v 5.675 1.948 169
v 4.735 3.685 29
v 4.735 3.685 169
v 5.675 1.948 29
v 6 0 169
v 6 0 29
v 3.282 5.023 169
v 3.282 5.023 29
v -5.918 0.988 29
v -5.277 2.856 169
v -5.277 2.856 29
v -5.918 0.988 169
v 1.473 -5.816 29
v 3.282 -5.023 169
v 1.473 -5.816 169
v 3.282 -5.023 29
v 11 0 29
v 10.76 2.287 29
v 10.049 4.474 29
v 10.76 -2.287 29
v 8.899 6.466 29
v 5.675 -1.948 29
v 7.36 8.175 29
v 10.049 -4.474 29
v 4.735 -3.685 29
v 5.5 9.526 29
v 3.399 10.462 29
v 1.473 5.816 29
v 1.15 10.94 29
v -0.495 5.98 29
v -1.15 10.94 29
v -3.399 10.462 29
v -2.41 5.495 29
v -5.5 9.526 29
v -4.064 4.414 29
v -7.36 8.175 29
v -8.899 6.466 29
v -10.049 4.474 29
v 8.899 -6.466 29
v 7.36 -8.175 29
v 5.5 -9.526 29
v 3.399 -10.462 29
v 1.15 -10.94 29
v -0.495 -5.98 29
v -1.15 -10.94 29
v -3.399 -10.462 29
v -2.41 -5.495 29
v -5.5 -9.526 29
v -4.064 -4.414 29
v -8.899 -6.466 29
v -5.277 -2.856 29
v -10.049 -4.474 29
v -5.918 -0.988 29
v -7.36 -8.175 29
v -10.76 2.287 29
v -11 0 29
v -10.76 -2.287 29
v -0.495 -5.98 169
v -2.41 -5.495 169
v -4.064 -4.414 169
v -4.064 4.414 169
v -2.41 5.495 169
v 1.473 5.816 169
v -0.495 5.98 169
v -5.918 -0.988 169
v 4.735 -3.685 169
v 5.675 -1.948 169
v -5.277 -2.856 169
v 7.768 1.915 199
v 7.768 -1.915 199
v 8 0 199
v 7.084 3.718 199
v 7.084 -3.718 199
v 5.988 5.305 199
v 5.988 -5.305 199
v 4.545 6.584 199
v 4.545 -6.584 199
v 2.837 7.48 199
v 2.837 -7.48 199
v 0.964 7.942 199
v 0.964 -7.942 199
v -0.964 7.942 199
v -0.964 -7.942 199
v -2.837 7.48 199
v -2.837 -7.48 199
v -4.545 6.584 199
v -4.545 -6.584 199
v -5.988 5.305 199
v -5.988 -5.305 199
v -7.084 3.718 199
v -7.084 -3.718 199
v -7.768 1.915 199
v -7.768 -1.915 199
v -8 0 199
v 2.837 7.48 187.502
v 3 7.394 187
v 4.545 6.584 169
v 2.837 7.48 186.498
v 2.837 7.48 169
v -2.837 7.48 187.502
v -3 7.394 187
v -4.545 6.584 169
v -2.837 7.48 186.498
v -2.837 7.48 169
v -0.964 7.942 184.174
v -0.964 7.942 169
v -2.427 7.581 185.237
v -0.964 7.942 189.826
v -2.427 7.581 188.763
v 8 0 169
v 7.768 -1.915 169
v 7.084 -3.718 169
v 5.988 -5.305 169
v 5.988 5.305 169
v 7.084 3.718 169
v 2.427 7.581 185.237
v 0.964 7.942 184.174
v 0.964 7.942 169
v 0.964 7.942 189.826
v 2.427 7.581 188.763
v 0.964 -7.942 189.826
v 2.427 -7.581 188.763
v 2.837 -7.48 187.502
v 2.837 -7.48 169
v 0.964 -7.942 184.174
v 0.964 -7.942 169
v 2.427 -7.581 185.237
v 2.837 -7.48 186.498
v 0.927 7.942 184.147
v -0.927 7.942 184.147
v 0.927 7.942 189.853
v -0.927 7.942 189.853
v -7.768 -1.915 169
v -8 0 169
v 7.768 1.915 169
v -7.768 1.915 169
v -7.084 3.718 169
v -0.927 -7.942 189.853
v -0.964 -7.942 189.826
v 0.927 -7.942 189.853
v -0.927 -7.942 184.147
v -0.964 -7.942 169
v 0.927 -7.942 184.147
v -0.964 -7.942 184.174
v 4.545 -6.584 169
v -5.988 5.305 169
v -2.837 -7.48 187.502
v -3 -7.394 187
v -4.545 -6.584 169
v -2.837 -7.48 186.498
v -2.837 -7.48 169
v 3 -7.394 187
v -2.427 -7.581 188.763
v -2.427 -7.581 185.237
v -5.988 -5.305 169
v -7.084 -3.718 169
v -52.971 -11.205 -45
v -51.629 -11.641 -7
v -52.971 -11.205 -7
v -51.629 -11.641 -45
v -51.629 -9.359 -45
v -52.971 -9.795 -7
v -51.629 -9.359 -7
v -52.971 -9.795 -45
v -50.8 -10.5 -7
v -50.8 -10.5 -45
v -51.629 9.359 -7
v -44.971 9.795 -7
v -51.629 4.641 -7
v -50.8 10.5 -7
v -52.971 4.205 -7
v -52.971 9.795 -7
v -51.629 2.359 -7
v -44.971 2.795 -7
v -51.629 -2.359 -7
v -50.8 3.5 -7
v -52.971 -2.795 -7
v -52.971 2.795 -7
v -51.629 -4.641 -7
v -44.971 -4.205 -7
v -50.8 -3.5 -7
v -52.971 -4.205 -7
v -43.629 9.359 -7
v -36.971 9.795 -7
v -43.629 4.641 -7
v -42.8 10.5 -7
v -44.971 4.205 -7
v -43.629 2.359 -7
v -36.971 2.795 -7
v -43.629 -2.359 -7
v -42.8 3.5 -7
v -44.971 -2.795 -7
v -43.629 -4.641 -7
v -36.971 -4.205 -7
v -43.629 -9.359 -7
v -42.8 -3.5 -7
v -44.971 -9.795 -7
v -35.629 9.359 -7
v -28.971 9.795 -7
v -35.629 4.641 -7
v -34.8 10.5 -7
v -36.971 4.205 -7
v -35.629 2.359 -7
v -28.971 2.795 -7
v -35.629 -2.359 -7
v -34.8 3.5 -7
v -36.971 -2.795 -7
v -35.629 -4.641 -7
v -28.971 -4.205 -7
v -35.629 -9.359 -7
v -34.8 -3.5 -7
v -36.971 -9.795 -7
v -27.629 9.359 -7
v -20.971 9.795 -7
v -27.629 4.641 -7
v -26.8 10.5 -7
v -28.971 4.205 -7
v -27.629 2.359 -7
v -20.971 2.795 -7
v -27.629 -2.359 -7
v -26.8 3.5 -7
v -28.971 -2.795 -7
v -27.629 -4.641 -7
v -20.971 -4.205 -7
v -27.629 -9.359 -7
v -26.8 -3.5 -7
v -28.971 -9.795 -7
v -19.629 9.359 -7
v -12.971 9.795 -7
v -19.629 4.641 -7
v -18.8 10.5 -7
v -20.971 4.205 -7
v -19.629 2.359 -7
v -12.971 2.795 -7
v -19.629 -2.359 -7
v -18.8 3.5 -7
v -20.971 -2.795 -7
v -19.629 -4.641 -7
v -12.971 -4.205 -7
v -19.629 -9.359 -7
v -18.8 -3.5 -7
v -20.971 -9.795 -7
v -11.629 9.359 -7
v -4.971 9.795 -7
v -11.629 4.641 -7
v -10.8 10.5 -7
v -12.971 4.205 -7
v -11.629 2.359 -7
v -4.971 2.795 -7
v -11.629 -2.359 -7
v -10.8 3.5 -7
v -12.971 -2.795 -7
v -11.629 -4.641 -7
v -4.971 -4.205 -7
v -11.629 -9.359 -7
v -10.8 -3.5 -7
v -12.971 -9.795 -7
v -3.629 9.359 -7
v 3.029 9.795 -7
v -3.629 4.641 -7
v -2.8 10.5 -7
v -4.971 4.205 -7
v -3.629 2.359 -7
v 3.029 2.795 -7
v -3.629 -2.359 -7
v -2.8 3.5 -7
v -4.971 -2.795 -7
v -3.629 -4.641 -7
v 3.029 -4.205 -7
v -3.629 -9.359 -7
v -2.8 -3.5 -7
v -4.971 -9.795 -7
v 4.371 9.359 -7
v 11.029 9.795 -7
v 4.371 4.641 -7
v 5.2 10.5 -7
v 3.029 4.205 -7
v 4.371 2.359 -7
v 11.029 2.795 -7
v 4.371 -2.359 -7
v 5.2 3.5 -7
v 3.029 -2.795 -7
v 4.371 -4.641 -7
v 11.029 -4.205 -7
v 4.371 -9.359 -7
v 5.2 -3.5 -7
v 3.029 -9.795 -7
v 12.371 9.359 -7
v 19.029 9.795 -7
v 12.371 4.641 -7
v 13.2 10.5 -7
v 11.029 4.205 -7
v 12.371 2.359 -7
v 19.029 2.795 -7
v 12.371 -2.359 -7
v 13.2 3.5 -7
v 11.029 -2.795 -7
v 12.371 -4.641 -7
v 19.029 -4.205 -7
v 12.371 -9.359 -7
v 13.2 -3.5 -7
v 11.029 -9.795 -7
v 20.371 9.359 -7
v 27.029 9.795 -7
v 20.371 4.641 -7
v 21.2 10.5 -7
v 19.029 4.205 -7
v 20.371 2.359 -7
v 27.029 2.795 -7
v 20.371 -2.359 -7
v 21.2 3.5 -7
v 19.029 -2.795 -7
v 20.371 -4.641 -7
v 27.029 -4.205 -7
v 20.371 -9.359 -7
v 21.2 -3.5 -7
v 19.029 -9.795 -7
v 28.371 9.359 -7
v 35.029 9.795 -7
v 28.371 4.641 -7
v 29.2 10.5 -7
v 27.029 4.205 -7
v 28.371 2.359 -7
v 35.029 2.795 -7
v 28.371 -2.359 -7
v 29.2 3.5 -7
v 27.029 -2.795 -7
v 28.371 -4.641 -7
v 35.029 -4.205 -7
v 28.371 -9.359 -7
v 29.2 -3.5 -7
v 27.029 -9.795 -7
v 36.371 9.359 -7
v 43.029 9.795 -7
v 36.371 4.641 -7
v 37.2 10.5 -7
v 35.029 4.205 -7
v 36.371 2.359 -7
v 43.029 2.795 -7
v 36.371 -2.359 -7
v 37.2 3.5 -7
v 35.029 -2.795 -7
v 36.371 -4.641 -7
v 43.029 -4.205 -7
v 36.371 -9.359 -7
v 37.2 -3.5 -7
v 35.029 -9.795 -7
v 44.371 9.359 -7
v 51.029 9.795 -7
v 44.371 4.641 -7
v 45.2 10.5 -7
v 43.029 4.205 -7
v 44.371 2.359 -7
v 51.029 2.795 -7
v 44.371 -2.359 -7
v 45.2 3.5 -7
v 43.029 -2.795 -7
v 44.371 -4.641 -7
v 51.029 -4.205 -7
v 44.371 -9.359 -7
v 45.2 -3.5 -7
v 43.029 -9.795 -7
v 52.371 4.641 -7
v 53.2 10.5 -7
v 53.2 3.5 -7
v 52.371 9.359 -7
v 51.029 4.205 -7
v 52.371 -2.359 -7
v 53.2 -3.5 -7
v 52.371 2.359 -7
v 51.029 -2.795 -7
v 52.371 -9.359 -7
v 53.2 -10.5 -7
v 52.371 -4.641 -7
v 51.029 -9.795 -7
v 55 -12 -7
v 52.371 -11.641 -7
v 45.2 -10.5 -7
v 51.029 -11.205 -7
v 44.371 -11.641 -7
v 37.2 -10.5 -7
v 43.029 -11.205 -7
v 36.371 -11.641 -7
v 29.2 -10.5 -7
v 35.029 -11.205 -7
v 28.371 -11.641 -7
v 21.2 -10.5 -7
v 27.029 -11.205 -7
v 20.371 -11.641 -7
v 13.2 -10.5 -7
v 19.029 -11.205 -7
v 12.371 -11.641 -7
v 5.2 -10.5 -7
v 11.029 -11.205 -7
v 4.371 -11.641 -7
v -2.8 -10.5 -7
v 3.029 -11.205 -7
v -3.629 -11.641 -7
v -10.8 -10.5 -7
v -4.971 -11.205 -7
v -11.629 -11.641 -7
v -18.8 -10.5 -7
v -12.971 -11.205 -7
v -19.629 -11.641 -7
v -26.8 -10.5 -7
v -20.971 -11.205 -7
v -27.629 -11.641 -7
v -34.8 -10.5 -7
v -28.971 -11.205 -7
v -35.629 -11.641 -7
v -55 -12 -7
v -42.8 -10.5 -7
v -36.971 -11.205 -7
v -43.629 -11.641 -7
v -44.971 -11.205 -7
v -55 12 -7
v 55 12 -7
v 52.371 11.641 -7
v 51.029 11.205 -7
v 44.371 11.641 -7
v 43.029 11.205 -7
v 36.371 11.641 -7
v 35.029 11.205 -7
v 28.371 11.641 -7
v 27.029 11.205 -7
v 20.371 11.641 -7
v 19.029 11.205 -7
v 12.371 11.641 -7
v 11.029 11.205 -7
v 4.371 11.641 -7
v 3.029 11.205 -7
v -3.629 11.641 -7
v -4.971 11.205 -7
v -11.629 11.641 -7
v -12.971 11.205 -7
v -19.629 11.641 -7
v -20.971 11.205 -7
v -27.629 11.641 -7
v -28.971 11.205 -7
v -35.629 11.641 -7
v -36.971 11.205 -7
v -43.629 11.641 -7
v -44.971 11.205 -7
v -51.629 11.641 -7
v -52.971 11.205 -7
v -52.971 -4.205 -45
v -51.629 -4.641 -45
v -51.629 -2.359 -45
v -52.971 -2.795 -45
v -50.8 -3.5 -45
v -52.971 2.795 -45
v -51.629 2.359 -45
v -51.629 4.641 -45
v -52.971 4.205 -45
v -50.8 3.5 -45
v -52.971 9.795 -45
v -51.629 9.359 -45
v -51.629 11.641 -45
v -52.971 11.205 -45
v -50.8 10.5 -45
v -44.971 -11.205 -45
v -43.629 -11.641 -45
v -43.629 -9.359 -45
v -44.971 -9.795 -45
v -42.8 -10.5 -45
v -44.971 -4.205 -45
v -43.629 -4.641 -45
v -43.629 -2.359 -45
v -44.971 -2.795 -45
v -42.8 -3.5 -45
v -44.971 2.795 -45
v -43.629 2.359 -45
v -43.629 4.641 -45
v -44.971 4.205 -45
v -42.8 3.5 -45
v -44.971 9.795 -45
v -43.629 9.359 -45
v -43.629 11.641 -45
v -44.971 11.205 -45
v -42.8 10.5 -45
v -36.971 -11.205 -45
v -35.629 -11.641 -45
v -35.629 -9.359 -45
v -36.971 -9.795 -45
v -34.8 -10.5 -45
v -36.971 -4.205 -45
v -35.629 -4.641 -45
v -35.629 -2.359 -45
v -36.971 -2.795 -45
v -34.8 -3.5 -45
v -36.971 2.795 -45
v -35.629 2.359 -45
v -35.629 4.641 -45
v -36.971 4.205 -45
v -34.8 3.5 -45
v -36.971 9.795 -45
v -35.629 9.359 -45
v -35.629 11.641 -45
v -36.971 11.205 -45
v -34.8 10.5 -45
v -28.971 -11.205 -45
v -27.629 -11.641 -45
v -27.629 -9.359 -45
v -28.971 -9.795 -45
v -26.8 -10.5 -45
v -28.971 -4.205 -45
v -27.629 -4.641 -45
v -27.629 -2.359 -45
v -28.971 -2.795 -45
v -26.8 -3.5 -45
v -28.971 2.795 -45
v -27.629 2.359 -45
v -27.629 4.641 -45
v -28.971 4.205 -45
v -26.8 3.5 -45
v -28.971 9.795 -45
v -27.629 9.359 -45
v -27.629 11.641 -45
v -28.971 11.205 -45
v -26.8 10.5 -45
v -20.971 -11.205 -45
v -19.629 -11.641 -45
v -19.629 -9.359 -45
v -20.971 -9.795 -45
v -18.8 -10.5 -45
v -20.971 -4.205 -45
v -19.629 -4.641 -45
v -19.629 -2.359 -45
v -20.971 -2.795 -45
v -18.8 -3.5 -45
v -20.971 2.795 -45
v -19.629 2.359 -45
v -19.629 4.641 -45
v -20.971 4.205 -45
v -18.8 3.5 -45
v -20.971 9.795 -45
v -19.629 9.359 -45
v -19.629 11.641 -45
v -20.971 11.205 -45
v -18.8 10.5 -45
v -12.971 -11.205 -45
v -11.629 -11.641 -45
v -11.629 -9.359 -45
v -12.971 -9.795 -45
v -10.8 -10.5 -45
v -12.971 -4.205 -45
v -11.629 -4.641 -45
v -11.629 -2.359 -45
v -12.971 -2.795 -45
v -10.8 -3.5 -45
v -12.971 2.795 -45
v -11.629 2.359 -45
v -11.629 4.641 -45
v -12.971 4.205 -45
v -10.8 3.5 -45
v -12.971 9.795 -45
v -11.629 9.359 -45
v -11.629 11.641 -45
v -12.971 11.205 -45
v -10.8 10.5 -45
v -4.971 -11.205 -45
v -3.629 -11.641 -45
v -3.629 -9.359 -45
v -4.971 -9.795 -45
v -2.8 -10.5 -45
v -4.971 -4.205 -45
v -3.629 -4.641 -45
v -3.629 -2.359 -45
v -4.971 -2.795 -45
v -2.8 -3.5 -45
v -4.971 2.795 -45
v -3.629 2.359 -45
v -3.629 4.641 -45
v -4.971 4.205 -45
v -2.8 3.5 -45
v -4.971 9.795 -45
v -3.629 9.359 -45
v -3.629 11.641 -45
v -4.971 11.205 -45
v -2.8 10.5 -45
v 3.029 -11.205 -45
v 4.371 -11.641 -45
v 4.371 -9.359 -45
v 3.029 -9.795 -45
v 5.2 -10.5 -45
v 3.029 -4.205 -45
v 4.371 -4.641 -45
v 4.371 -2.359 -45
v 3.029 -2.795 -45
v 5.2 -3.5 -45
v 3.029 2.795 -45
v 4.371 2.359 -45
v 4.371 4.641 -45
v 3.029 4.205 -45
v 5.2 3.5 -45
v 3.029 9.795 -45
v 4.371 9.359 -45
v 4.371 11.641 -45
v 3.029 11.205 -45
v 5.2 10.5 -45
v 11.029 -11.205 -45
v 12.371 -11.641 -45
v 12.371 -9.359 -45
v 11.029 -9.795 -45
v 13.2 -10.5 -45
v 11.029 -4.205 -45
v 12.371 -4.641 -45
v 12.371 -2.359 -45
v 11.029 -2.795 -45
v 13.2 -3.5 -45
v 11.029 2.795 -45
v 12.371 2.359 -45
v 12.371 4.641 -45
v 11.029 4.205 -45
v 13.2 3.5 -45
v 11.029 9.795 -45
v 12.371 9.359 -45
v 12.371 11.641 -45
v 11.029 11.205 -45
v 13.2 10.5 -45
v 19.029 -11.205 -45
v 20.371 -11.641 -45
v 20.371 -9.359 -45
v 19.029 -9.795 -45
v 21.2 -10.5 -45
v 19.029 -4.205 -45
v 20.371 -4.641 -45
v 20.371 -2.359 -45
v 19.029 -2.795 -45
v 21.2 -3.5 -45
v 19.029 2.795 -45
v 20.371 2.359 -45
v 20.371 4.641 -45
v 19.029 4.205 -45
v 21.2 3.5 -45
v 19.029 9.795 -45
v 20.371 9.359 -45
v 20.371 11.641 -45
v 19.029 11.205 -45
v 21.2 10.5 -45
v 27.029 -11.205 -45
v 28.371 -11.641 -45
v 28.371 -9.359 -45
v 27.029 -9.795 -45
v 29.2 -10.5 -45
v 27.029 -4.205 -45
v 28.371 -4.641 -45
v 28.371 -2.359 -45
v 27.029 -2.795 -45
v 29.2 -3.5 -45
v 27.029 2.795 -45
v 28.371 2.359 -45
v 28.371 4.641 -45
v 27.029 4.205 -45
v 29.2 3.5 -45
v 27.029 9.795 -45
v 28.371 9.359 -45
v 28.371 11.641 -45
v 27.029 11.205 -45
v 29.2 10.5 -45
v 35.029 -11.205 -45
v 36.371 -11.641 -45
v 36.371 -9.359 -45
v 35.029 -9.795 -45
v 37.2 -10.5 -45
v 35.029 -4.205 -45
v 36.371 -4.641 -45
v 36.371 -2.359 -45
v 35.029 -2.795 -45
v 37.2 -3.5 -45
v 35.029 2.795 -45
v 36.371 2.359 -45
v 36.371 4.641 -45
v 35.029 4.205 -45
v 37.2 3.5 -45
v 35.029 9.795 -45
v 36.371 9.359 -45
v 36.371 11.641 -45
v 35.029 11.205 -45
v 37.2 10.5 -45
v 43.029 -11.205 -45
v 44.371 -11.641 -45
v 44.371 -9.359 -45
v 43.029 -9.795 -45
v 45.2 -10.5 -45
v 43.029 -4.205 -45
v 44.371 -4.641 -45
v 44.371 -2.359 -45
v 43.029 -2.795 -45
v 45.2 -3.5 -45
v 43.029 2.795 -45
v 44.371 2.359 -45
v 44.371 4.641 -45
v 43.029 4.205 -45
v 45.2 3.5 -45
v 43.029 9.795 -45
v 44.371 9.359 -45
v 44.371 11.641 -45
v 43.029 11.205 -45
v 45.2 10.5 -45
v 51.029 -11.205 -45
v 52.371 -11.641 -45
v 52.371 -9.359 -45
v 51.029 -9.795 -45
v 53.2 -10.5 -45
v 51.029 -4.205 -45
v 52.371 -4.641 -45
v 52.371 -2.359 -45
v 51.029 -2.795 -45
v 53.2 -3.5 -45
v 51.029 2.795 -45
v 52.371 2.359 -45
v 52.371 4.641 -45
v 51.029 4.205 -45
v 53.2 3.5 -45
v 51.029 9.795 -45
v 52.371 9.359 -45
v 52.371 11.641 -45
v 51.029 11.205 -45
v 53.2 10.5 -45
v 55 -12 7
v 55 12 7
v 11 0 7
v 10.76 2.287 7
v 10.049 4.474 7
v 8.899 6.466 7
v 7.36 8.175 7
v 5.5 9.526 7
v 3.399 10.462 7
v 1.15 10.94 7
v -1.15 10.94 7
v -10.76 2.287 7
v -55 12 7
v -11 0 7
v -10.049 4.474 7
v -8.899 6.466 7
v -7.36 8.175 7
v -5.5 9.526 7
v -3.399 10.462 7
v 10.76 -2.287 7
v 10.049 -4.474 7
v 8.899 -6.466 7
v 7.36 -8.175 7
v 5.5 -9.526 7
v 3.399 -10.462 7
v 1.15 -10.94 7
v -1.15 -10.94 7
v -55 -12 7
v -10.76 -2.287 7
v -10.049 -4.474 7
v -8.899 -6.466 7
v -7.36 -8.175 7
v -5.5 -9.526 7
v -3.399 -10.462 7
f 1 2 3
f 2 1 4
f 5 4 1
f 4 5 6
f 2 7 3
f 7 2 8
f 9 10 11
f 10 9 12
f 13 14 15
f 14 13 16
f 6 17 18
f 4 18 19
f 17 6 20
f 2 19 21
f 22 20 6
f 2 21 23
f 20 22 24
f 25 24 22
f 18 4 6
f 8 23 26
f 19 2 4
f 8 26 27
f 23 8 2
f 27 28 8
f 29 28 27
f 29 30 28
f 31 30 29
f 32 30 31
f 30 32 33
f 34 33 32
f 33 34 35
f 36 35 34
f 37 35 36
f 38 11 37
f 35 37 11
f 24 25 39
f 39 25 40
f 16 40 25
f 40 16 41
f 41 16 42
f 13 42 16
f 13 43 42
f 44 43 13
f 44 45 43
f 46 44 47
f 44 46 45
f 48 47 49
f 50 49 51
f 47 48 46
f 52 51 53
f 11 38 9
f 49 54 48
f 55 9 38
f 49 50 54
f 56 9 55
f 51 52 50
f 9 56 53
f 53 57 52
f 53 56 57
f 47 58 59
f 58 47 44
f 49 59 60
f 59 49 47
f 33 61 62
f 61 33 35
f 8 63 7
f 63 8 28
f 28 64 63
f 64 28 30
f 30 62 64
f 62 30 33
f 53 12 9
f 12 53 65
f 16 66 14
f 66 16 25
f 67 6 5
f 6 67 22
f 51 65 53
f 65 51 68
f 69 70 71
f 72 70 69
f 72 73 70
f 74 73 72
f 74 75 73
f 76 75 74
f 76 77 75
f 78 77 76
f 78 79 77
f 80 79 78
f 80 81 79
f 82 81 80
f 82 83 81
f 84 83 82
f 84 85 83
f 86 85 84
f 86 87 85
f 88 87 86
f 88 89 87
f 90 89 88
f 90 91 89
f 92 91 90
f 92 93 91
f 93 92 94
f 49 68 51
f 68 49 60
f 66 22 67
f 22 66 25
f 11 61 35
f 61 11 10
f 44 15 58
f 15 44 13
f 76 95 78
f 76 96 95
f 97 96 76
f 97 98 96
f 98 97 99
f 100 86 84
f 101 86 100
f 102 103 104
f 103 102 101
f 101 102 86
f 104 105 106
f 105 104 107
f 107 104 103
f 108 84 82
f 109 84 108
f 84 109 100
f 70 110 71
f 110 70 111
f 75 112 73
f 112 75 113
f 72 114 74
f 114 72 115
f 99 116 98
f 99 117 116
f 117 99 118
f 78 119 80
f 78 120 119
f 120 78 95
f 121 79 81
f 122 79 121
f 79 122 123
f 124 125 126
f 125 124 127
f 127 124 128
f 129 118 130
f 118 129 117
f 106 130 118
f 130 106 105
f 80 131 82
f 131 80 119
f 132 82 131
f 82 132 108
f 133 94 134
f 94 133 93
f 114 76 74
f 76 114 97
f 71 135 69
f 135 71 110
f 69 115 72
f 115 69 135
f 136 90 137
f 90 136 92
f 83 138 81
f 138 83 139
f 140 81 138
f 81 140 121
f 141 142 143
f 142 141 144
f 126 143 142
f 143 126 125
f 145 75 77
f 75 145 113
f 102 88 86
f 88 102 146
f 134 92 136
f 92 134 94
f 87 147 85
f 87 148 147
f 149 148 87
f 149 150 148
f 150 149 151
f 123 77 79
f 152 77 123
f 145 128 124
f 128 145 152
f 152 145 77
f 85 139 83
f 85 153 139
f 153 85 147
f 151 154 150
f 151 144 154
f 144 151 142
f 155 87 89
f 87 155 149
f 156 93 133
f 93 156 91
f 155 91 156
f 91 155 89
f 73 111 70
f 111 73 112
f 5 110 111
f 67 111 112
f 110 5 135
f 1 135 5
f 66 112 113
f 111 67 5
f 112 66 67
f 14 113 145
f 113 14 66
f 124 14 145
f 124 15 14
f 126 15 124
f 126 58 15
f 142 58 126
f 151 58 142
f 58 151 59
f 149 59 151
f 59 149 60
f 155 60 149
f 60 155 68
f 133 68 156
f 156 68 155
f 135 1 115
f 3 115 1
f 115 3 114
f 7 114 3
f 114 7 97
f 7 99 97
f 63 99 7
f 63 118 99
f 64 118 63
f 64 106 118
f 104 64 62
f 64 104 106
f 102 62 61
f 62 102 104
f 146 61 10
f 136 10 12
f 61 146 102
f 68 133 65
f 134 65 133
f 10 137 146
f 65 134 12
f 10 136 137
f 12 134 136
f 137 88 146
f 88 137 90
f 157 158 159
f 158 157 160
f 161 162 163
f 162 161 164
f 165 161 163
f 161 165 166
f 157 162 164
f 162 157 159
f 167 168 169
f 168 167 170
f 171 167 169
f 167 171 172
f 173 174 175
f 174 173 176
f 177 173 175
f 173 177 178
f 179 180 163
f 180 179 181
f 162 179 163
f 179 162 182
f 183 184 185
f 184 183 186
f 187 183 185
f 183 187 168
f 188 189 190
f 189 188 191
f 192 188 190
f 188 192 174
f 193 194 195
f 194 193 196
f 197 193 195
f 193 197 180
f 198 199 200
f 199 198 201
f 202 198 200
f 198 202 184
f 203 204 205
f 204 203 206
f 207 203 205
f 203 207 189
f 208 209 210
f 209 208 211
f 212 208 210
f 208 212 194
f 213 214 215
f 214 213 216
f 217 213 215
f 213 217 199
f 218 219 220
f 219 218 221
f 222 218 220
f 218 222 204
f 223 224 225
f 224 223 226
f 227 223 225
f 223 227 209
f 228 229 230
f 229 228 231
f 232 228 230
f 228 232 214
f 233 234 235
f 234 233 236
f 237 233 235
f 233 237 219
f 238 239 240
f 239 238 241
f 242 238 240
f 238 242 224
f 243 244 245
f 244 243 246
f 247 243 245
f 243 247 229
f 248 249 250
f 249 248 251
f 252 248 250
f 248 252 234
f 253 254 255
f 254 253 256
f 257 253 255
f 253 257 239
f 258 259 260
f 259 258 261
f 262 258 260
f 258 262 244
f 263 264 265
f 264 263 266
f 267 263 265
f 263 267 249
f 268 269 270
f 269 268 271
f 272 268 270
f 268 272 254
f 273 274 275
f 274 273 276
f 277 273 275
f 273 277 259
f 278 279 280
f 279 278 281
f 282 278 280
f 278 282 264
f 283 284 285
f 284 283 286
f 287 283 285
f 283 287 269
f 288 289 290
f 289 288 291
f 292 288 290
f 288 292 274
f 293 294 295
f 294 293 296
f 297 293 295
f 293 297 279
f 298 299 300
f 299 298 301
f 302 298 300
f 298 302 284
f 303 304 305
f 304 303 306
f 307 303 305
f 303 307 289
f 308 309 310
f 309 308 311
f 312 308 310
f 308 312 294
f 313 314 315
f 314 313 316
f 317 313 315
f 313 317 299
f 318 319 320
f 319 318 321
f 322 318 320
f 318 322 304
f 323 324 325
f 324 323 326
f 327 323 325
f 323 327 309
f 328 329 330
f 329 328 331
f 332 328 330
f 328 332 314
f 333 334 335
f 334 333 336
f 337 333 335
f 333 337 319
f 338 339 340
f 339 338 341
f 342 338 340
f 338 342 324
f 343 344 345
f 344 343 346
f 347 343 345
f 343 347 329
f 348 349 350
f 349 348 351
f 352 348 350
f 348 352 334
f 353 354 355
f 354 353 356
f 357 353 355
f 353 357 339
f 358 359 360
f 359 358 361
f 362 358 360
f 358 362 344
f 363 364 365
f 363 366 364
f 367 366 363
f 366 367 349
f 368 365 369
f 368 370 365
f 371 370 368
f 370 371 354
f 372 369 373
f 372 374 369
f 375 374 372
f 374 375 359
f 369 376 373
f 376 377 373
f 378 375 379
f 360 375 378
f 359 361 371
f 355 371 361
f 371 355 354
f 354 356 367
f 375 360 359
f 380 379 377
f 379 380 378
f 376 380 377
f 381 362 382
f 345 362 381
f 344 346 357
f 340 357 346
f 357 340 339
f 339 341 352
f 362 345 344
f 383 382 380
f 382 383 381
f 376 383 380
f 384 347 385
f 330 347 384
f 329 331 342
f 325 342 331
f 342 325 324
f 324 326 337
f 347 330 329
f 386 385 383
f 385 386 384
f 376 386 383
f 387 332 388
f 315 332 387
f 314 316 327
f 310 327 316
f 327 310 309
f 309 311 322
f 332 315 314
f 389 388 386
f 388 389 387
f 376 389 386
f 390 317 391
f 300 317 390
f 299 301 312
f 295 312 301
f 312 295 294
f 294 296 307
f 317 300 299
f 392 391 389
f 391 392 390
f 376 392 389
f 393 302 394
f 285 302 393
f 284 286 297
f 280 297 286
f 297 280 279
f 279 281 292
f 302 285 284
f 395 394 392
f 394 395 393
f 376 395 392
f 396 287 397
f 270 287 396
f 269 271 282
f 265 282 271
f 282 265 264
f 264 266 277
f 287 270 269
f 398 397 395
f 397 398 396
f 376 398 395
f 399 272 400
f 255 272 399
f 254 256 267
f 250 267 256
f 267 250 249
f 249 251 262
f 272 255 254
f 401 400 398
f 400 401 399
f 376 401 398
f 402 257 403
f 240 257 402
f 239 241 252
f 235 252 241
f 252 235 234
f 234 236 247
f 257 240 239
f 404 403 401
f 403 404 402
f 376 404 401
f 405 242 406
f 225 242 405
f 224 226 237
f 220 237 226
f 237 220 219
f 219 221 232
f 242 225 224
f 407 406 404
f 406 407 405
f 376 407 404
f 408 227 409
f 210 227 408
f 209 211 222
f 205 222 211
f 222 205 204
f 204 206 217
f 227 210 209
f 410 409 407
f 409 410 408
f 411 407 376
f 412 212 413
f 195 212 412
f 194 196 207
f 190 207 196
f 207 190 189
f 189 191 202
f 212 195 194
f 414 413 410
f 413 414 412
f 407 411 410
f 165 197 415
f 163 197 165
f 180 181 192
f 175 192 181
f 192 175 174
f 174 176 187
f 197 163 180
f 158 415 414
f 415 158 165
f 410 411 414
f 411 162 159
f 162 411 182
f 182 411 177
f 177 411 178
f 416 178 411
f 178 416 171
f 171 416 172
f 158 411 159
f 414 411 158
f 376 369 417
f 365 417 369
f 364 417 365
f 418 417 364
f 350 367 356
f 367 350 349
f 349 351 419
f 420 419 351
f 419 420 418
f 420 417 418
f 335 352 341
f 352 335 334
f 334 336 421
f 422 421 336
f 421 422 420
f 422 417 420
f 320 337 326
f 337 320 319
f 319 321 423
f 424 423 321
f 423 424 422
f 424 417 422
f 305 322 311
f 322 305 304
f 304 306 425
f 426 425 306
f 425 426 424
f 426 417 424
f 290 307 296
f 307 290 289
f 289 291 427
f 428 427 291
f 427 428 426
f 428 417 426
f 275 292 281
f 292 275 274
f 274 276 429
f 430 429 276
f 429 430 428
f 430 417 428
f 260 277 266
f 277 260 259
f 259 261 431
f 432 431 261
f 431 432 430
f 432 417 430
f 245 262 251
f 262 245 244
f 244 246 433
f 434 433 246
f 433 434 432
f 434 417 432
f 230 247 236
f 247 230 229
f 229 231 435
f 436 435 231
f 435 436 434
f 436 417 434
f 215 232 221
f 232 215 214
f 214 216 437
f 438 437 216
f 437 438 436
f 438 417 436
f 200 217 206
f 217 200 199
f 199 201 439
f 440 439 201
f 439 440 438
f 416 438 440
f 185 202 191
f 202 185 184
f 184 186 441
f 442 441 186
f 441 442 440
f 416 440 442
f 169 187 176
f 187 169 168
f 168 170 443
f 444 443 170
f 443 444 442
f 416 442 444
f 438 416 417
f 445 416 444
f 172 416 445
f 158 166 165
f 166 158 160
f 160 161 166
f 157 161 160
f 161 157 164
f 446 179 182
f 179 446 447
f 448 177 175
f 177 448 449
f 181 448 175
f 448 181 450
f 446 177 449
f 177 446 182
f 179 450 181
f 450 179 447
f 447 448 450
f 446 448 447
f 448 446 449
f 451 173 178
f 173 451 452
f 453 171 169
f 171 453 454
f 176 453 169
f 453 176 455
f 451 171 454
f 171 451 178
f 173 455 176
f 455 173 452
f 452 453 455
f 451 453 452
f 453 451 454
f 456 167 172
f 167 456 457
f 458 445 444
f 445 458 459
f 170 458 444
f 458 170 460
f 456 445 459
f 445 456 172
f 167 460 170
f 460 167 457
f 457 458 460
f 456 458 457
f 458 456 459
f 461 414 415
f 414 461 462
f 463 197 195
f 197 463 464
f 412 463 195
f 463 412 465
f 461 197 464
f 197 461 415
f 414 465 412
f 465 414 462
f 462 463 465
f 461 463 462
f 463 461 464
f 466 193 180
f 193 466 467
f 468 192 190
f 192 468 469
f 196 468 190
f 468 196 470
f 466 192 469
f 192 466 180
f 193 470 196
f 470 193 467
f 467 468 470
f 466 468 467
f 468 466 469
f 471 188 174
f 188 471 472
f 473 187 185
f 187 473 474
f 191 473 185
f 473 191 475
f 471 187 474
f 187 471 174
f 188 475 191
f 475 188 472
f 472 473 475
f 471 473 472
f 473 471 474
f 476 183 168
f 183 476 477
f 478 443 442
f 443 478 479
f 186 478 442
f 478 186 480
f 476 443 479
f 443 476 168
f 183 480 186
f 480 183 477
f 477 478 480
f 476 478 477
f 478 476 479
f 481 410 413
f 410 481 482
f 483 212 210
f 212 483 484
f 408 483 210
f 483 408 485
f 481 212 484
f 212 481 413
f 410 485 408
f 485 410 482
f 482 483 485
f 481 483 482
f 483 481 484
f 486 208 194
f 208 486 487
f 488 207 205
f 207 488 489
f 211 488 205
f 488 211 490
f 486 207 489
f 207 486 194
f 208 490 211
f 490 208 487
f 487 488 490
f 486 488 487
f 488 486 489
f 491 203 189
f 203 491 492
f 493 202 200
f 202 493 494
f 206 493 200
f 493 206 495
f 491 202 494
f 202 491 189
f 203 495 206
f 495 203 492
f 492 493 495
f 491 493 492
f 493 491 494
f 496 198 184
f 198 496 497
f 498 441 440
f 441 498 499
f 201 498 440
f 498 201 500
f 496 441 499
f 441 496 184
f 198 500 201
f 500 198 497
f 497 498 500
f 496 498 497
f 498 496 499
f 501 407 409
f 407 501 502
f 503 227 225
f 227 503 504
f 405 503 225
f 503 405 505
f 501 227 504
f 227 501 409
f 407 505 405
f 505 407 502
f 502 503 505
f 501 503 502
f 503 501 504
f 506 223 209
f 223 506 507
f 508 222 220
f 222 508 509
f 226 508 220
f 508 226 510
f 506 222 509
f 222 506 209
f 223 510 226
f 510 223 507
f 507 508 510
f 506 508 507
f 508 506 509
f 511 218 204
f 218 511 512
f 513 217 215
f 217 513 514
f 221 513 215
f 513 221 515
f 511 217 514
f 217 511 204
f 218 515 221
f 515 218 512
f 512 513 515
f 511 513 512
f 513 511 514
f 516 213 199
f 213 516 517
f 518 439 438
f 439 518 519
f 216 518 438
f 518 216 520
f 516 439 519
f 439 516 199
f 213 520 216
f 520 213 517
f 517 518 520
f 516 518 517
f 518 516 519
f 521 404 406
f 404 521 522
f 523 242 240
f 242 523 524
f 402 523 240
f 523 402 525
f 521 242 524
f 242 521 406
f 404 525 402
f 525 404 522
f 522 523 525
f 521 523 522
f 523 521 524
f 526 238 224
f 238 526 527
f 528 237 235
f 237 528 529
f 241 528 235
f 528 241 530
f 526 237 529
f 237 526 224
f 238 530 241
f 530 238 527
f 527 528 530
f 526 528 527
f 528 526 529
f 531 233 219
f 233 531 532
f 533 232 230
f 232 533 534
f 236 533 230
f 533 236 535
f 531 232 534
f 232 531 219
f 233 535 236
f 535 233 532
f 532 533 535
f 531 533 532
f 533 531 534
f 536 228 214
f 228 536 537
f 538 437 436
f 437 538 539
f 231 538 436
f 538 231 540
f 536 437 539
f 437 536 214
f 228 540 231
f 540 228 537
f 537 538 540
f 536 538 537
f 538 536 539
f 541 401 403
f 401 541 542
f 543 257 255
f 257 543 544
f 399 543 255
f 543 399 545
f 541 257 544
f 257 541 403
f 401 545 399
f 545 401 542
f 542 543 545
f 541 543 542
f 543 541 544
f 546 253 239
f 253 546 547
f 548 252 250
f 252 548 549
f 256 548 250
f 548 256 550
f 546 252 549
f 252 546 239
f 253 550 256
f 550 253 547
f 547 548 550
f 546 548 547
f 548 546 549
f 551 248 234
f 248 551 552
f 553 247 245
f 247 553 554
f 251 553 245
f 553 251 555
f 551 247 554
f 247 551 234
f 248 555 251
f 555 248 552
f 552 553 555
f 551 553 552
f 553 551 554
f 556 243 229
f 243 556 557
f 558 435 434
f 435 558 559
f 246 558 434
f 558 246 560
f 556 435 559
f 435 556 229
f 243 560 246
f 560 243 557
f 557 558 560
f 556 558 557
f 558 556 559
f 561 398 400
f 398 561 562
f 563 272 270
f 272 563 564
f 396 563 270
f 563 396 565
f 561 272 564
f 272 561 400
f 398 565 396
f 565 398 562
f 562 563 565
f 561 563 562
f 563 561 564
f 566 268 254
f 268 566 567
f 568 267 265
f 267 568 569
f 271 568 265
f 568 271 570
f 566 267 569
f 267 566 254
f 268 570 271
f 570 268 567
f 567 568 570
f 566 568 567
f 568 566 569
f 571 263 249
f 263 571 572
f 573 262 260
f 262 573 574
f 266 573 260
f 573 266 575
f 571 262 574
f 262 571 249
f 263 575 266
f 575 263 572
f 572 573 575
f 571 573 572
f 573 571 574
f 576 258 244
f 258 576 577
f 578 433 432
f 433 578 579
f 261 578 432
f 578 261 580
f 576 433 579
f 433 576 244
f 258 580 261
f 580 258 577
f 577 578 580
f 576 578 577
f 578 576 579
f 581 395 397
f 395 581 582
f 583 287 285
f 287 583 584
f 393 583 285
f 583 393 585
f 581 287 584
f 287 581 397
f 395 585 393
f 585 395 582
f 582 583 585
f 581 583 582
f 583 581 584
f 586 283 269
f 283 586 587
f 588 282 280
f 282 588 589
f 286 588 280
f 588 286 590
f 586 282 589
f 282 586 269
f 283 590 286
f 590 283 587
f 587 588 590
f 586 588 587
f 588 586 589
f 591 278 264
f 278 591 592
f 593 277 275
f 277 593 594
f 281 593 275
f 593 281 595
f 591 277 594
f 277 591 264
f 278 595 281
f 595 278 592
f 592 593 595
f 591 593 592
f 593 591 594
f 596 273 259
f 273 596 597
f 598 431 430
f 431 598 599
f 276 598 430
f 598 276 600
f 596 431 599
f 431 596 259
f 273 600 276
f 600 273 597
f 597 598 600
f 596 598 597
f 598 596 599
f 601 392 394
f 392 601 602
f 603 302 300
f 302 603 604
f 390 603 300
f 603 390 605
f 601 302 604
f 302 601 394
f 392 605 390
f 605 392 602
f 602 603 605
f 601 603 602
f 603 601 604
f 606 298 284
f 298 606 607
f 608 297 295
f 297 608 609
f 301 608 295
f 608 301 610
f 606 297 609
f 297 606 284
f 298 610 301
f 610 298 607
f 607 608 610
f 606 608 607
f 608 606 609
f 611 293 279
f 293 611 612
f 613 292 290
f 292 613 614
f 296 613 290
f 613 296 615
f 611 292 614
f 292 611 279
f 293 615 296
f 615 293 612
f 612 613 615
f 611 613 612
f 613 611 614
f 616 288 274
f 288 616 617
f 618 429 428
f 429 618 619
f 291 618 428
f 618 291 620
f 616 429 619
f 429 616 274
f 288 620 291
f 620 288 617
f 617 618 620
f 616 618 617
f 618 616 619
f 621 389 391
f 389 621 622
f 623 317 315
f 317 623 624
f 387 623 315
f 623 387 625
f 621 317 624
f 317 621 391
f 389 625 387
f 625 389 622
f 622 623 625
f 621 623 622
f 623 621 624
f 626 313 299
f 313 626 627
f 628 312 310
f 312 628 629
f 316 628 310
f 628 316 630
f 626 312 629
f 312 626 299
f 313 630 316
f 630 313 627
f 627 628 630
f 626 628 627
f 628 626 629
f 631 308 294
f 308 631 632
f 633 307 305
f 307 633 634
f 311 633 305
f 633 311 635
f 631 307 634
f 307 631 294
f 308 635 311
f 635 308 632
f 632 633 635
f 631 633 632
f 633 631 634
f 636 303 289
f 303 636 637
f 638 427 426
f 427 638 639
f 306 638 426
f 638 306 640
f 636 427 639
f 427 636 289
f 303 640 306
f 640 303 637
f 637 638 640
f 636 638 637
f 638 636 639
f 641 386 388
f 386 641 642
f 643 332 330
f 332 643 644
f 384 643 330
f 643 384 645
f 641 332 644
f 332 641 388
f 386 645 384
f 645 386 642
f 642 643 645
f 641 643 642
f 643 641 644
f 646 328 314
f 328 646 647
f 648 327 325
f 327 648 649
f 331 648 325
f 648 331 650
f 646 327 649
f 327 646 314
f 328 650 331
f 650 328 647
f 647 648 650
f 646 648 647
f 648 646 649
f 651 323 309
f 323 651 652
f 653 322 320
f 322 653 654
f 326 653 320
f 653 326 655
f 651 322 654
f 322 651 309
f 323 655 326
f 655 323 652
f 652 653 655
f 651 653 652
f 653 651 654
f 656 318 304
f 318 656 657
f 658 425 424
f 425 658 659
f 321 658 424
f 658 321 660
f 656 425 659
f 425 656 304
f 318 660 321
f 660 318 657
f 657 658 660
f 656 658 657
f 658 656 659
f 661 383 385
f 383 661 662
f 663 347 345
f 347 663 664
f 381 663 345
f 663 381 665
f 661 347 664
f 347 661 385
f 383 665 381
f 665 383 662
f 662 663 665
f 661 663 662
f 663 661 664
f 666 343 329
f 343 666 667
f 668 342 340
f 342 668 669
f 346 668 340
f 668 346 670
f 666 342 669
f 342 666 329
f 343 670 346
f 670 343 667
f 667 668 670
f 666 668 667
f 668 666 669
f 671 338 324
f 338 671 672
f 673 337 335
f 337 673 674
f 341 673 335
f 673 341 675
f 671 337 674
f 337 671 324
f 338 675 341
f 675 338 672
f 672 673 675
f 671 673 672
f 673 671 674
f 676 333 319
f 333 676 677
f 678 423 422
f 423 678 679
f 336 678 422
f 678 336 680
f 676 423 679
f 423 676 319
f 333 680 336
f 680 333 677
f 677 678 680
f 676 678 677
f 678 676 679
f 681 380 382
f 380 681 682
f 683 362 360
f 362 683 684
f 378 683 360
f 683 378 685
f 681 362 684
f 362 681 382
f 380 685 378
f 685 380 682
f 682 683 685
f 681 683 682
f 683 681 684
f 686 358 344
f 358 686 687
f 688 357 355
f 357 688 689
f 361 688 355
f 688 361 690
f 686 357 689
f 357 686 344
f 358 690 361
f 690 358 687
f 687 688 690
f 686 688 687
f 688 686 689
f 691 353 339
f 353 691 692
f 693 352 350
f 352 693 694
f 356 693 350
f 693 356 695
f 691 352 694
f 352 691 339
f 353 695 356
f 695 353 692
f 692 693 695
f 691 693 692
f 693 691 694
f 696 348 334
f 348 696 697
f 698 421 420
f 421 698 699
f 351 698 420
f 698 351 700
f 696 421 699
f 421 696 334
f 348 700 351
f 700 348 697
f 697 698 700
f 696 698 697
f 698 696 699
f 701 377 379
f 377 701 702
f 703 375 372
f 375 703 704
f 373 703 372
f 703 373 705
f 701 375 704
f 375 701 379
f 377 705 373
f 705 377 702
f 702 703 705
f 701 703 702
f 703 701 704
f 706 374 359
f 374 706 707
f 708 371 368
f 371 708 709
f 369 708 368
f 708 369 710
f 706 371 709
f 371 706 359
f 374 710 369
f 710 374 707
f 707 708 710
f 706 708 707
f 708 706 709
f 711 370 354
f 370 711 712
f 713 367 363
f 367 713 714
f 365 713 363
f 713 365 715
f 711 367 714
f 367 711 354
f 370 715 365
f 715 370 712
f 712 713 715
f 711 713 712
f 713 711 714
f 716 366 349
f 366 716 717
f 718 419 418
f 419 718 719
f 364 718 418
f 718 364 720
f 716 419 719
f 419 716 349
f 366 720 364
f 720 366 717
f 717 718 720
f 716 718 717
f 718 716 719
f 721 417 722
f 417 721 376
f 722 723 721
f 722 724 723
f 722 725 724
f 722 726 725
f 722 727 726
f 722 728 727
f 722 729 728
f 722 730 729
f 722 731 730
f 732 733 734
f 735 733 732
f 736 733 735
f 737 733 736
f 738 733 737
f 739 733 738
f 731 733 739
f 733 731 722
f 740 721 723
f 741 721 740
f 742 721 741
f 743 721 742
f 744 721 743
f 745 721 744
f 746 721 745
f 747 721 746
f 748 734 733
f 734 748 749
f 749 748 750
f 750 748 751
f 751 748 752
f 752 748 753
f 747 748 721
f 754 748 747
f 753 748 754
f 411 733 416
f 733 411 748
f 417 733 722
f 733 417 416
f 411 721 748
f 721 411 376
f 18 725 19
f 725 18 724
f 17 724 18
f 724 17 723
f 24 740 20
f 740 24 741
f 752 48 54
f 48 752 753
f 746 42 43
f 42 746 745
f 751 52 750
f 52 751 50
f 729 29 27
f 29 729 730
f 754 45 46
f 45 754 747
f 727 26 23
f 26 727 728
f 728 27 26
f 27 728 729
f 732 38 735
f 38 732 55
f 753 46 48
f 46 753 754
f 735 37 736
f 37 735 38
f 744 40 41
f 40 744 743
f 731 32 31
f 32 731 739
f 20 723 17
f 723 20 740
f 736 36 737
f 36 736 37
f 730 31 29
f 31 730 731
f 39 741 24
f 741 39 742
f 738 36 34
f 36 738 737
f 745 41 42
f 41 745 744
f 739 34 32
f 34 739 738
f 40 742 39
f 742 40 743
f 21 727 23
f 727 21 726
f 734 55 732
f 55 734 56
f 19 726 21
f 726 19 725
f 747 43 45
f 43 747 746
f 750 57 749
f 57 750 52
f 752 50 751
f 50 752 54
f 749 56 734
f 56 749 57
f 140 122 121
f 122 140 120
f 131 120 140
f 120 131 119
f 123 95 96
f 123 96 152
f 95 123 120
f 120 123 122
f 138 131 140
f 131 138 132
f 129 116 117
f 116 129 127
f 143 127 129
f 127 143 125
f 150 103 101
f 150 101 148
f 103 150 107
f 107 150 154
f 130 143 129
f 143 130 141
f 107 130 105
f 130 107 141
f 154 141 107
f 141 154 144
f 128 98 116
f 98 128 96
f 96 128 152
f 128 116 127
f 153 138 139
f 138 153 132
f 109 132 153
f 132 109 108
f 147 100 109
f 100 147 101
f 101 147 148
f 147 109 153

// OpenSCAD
// Broom with handle, grip, socket, head and bristles

handle_len = 170;
handle_r = 6;
grip_len = 30;
grip_r = 8;
hanger_r = 3;
hanger_offset = 12;
socket_h = 22;
socket_r = 11;
head_x = 110;
head_y = 24;
head_z = 14;
bristle_count = 13;
bristle_rows = 3;
bristle_r = 1.2;
bristle_len = 38;
bristle_x_gap = 8;
bristle_y_gap = 7;

module handle() {
    union() {
        translate([0, 0, head_z / 2 + socket_h + handle_len / 2]) {
            cylinder(h=handle_len, r=handle_r, center=true);
        }
        translate([0, 0, head_z / 2 + socket_h + handle_len - grip_len / 2]) {
            cylinder(h=grip_len, r=grip_r, center=true);
        }
    }
}

module hanging_hole() {
    translate([0, 0, head_z / 2 + socket_h + handle_len - hanger_offset]) {
        rotate([90, 0, 0]) {
            cylinder(h=grip_r * 4, r=hanger_r, center=true);
        }
    }
}

module socket() {
    translate([0, 0, head_z / 2 + socket_h / 2]) {
        cylinder(h=socket_h, r=socket_r, center=true);
    }
}

module broom_head() {
    cube([head_x, head_y, head_z], center=true);
}

module bristle() {
    cylinder(h=bristle_len, r=bristle_r, center=true);
}

module bristle_group() {
    for (x = [0 : bristle_count]) {
        for (y = [0 : bristle_rows]) {
            translate([x * bristle_x_gap - bristle_count * bristle_x_gap / 2, y * bristle_y_gap - bristle_rows * bristle_y_gap / 2, -head_z / 2 - bristle_len / 2]) {
                bristle();
            }
        }
    }
}

difference() {
    union() {
        broom_head();
        socket();
        handle();
        bristle_group();
    }
    hanging_hole();
}
